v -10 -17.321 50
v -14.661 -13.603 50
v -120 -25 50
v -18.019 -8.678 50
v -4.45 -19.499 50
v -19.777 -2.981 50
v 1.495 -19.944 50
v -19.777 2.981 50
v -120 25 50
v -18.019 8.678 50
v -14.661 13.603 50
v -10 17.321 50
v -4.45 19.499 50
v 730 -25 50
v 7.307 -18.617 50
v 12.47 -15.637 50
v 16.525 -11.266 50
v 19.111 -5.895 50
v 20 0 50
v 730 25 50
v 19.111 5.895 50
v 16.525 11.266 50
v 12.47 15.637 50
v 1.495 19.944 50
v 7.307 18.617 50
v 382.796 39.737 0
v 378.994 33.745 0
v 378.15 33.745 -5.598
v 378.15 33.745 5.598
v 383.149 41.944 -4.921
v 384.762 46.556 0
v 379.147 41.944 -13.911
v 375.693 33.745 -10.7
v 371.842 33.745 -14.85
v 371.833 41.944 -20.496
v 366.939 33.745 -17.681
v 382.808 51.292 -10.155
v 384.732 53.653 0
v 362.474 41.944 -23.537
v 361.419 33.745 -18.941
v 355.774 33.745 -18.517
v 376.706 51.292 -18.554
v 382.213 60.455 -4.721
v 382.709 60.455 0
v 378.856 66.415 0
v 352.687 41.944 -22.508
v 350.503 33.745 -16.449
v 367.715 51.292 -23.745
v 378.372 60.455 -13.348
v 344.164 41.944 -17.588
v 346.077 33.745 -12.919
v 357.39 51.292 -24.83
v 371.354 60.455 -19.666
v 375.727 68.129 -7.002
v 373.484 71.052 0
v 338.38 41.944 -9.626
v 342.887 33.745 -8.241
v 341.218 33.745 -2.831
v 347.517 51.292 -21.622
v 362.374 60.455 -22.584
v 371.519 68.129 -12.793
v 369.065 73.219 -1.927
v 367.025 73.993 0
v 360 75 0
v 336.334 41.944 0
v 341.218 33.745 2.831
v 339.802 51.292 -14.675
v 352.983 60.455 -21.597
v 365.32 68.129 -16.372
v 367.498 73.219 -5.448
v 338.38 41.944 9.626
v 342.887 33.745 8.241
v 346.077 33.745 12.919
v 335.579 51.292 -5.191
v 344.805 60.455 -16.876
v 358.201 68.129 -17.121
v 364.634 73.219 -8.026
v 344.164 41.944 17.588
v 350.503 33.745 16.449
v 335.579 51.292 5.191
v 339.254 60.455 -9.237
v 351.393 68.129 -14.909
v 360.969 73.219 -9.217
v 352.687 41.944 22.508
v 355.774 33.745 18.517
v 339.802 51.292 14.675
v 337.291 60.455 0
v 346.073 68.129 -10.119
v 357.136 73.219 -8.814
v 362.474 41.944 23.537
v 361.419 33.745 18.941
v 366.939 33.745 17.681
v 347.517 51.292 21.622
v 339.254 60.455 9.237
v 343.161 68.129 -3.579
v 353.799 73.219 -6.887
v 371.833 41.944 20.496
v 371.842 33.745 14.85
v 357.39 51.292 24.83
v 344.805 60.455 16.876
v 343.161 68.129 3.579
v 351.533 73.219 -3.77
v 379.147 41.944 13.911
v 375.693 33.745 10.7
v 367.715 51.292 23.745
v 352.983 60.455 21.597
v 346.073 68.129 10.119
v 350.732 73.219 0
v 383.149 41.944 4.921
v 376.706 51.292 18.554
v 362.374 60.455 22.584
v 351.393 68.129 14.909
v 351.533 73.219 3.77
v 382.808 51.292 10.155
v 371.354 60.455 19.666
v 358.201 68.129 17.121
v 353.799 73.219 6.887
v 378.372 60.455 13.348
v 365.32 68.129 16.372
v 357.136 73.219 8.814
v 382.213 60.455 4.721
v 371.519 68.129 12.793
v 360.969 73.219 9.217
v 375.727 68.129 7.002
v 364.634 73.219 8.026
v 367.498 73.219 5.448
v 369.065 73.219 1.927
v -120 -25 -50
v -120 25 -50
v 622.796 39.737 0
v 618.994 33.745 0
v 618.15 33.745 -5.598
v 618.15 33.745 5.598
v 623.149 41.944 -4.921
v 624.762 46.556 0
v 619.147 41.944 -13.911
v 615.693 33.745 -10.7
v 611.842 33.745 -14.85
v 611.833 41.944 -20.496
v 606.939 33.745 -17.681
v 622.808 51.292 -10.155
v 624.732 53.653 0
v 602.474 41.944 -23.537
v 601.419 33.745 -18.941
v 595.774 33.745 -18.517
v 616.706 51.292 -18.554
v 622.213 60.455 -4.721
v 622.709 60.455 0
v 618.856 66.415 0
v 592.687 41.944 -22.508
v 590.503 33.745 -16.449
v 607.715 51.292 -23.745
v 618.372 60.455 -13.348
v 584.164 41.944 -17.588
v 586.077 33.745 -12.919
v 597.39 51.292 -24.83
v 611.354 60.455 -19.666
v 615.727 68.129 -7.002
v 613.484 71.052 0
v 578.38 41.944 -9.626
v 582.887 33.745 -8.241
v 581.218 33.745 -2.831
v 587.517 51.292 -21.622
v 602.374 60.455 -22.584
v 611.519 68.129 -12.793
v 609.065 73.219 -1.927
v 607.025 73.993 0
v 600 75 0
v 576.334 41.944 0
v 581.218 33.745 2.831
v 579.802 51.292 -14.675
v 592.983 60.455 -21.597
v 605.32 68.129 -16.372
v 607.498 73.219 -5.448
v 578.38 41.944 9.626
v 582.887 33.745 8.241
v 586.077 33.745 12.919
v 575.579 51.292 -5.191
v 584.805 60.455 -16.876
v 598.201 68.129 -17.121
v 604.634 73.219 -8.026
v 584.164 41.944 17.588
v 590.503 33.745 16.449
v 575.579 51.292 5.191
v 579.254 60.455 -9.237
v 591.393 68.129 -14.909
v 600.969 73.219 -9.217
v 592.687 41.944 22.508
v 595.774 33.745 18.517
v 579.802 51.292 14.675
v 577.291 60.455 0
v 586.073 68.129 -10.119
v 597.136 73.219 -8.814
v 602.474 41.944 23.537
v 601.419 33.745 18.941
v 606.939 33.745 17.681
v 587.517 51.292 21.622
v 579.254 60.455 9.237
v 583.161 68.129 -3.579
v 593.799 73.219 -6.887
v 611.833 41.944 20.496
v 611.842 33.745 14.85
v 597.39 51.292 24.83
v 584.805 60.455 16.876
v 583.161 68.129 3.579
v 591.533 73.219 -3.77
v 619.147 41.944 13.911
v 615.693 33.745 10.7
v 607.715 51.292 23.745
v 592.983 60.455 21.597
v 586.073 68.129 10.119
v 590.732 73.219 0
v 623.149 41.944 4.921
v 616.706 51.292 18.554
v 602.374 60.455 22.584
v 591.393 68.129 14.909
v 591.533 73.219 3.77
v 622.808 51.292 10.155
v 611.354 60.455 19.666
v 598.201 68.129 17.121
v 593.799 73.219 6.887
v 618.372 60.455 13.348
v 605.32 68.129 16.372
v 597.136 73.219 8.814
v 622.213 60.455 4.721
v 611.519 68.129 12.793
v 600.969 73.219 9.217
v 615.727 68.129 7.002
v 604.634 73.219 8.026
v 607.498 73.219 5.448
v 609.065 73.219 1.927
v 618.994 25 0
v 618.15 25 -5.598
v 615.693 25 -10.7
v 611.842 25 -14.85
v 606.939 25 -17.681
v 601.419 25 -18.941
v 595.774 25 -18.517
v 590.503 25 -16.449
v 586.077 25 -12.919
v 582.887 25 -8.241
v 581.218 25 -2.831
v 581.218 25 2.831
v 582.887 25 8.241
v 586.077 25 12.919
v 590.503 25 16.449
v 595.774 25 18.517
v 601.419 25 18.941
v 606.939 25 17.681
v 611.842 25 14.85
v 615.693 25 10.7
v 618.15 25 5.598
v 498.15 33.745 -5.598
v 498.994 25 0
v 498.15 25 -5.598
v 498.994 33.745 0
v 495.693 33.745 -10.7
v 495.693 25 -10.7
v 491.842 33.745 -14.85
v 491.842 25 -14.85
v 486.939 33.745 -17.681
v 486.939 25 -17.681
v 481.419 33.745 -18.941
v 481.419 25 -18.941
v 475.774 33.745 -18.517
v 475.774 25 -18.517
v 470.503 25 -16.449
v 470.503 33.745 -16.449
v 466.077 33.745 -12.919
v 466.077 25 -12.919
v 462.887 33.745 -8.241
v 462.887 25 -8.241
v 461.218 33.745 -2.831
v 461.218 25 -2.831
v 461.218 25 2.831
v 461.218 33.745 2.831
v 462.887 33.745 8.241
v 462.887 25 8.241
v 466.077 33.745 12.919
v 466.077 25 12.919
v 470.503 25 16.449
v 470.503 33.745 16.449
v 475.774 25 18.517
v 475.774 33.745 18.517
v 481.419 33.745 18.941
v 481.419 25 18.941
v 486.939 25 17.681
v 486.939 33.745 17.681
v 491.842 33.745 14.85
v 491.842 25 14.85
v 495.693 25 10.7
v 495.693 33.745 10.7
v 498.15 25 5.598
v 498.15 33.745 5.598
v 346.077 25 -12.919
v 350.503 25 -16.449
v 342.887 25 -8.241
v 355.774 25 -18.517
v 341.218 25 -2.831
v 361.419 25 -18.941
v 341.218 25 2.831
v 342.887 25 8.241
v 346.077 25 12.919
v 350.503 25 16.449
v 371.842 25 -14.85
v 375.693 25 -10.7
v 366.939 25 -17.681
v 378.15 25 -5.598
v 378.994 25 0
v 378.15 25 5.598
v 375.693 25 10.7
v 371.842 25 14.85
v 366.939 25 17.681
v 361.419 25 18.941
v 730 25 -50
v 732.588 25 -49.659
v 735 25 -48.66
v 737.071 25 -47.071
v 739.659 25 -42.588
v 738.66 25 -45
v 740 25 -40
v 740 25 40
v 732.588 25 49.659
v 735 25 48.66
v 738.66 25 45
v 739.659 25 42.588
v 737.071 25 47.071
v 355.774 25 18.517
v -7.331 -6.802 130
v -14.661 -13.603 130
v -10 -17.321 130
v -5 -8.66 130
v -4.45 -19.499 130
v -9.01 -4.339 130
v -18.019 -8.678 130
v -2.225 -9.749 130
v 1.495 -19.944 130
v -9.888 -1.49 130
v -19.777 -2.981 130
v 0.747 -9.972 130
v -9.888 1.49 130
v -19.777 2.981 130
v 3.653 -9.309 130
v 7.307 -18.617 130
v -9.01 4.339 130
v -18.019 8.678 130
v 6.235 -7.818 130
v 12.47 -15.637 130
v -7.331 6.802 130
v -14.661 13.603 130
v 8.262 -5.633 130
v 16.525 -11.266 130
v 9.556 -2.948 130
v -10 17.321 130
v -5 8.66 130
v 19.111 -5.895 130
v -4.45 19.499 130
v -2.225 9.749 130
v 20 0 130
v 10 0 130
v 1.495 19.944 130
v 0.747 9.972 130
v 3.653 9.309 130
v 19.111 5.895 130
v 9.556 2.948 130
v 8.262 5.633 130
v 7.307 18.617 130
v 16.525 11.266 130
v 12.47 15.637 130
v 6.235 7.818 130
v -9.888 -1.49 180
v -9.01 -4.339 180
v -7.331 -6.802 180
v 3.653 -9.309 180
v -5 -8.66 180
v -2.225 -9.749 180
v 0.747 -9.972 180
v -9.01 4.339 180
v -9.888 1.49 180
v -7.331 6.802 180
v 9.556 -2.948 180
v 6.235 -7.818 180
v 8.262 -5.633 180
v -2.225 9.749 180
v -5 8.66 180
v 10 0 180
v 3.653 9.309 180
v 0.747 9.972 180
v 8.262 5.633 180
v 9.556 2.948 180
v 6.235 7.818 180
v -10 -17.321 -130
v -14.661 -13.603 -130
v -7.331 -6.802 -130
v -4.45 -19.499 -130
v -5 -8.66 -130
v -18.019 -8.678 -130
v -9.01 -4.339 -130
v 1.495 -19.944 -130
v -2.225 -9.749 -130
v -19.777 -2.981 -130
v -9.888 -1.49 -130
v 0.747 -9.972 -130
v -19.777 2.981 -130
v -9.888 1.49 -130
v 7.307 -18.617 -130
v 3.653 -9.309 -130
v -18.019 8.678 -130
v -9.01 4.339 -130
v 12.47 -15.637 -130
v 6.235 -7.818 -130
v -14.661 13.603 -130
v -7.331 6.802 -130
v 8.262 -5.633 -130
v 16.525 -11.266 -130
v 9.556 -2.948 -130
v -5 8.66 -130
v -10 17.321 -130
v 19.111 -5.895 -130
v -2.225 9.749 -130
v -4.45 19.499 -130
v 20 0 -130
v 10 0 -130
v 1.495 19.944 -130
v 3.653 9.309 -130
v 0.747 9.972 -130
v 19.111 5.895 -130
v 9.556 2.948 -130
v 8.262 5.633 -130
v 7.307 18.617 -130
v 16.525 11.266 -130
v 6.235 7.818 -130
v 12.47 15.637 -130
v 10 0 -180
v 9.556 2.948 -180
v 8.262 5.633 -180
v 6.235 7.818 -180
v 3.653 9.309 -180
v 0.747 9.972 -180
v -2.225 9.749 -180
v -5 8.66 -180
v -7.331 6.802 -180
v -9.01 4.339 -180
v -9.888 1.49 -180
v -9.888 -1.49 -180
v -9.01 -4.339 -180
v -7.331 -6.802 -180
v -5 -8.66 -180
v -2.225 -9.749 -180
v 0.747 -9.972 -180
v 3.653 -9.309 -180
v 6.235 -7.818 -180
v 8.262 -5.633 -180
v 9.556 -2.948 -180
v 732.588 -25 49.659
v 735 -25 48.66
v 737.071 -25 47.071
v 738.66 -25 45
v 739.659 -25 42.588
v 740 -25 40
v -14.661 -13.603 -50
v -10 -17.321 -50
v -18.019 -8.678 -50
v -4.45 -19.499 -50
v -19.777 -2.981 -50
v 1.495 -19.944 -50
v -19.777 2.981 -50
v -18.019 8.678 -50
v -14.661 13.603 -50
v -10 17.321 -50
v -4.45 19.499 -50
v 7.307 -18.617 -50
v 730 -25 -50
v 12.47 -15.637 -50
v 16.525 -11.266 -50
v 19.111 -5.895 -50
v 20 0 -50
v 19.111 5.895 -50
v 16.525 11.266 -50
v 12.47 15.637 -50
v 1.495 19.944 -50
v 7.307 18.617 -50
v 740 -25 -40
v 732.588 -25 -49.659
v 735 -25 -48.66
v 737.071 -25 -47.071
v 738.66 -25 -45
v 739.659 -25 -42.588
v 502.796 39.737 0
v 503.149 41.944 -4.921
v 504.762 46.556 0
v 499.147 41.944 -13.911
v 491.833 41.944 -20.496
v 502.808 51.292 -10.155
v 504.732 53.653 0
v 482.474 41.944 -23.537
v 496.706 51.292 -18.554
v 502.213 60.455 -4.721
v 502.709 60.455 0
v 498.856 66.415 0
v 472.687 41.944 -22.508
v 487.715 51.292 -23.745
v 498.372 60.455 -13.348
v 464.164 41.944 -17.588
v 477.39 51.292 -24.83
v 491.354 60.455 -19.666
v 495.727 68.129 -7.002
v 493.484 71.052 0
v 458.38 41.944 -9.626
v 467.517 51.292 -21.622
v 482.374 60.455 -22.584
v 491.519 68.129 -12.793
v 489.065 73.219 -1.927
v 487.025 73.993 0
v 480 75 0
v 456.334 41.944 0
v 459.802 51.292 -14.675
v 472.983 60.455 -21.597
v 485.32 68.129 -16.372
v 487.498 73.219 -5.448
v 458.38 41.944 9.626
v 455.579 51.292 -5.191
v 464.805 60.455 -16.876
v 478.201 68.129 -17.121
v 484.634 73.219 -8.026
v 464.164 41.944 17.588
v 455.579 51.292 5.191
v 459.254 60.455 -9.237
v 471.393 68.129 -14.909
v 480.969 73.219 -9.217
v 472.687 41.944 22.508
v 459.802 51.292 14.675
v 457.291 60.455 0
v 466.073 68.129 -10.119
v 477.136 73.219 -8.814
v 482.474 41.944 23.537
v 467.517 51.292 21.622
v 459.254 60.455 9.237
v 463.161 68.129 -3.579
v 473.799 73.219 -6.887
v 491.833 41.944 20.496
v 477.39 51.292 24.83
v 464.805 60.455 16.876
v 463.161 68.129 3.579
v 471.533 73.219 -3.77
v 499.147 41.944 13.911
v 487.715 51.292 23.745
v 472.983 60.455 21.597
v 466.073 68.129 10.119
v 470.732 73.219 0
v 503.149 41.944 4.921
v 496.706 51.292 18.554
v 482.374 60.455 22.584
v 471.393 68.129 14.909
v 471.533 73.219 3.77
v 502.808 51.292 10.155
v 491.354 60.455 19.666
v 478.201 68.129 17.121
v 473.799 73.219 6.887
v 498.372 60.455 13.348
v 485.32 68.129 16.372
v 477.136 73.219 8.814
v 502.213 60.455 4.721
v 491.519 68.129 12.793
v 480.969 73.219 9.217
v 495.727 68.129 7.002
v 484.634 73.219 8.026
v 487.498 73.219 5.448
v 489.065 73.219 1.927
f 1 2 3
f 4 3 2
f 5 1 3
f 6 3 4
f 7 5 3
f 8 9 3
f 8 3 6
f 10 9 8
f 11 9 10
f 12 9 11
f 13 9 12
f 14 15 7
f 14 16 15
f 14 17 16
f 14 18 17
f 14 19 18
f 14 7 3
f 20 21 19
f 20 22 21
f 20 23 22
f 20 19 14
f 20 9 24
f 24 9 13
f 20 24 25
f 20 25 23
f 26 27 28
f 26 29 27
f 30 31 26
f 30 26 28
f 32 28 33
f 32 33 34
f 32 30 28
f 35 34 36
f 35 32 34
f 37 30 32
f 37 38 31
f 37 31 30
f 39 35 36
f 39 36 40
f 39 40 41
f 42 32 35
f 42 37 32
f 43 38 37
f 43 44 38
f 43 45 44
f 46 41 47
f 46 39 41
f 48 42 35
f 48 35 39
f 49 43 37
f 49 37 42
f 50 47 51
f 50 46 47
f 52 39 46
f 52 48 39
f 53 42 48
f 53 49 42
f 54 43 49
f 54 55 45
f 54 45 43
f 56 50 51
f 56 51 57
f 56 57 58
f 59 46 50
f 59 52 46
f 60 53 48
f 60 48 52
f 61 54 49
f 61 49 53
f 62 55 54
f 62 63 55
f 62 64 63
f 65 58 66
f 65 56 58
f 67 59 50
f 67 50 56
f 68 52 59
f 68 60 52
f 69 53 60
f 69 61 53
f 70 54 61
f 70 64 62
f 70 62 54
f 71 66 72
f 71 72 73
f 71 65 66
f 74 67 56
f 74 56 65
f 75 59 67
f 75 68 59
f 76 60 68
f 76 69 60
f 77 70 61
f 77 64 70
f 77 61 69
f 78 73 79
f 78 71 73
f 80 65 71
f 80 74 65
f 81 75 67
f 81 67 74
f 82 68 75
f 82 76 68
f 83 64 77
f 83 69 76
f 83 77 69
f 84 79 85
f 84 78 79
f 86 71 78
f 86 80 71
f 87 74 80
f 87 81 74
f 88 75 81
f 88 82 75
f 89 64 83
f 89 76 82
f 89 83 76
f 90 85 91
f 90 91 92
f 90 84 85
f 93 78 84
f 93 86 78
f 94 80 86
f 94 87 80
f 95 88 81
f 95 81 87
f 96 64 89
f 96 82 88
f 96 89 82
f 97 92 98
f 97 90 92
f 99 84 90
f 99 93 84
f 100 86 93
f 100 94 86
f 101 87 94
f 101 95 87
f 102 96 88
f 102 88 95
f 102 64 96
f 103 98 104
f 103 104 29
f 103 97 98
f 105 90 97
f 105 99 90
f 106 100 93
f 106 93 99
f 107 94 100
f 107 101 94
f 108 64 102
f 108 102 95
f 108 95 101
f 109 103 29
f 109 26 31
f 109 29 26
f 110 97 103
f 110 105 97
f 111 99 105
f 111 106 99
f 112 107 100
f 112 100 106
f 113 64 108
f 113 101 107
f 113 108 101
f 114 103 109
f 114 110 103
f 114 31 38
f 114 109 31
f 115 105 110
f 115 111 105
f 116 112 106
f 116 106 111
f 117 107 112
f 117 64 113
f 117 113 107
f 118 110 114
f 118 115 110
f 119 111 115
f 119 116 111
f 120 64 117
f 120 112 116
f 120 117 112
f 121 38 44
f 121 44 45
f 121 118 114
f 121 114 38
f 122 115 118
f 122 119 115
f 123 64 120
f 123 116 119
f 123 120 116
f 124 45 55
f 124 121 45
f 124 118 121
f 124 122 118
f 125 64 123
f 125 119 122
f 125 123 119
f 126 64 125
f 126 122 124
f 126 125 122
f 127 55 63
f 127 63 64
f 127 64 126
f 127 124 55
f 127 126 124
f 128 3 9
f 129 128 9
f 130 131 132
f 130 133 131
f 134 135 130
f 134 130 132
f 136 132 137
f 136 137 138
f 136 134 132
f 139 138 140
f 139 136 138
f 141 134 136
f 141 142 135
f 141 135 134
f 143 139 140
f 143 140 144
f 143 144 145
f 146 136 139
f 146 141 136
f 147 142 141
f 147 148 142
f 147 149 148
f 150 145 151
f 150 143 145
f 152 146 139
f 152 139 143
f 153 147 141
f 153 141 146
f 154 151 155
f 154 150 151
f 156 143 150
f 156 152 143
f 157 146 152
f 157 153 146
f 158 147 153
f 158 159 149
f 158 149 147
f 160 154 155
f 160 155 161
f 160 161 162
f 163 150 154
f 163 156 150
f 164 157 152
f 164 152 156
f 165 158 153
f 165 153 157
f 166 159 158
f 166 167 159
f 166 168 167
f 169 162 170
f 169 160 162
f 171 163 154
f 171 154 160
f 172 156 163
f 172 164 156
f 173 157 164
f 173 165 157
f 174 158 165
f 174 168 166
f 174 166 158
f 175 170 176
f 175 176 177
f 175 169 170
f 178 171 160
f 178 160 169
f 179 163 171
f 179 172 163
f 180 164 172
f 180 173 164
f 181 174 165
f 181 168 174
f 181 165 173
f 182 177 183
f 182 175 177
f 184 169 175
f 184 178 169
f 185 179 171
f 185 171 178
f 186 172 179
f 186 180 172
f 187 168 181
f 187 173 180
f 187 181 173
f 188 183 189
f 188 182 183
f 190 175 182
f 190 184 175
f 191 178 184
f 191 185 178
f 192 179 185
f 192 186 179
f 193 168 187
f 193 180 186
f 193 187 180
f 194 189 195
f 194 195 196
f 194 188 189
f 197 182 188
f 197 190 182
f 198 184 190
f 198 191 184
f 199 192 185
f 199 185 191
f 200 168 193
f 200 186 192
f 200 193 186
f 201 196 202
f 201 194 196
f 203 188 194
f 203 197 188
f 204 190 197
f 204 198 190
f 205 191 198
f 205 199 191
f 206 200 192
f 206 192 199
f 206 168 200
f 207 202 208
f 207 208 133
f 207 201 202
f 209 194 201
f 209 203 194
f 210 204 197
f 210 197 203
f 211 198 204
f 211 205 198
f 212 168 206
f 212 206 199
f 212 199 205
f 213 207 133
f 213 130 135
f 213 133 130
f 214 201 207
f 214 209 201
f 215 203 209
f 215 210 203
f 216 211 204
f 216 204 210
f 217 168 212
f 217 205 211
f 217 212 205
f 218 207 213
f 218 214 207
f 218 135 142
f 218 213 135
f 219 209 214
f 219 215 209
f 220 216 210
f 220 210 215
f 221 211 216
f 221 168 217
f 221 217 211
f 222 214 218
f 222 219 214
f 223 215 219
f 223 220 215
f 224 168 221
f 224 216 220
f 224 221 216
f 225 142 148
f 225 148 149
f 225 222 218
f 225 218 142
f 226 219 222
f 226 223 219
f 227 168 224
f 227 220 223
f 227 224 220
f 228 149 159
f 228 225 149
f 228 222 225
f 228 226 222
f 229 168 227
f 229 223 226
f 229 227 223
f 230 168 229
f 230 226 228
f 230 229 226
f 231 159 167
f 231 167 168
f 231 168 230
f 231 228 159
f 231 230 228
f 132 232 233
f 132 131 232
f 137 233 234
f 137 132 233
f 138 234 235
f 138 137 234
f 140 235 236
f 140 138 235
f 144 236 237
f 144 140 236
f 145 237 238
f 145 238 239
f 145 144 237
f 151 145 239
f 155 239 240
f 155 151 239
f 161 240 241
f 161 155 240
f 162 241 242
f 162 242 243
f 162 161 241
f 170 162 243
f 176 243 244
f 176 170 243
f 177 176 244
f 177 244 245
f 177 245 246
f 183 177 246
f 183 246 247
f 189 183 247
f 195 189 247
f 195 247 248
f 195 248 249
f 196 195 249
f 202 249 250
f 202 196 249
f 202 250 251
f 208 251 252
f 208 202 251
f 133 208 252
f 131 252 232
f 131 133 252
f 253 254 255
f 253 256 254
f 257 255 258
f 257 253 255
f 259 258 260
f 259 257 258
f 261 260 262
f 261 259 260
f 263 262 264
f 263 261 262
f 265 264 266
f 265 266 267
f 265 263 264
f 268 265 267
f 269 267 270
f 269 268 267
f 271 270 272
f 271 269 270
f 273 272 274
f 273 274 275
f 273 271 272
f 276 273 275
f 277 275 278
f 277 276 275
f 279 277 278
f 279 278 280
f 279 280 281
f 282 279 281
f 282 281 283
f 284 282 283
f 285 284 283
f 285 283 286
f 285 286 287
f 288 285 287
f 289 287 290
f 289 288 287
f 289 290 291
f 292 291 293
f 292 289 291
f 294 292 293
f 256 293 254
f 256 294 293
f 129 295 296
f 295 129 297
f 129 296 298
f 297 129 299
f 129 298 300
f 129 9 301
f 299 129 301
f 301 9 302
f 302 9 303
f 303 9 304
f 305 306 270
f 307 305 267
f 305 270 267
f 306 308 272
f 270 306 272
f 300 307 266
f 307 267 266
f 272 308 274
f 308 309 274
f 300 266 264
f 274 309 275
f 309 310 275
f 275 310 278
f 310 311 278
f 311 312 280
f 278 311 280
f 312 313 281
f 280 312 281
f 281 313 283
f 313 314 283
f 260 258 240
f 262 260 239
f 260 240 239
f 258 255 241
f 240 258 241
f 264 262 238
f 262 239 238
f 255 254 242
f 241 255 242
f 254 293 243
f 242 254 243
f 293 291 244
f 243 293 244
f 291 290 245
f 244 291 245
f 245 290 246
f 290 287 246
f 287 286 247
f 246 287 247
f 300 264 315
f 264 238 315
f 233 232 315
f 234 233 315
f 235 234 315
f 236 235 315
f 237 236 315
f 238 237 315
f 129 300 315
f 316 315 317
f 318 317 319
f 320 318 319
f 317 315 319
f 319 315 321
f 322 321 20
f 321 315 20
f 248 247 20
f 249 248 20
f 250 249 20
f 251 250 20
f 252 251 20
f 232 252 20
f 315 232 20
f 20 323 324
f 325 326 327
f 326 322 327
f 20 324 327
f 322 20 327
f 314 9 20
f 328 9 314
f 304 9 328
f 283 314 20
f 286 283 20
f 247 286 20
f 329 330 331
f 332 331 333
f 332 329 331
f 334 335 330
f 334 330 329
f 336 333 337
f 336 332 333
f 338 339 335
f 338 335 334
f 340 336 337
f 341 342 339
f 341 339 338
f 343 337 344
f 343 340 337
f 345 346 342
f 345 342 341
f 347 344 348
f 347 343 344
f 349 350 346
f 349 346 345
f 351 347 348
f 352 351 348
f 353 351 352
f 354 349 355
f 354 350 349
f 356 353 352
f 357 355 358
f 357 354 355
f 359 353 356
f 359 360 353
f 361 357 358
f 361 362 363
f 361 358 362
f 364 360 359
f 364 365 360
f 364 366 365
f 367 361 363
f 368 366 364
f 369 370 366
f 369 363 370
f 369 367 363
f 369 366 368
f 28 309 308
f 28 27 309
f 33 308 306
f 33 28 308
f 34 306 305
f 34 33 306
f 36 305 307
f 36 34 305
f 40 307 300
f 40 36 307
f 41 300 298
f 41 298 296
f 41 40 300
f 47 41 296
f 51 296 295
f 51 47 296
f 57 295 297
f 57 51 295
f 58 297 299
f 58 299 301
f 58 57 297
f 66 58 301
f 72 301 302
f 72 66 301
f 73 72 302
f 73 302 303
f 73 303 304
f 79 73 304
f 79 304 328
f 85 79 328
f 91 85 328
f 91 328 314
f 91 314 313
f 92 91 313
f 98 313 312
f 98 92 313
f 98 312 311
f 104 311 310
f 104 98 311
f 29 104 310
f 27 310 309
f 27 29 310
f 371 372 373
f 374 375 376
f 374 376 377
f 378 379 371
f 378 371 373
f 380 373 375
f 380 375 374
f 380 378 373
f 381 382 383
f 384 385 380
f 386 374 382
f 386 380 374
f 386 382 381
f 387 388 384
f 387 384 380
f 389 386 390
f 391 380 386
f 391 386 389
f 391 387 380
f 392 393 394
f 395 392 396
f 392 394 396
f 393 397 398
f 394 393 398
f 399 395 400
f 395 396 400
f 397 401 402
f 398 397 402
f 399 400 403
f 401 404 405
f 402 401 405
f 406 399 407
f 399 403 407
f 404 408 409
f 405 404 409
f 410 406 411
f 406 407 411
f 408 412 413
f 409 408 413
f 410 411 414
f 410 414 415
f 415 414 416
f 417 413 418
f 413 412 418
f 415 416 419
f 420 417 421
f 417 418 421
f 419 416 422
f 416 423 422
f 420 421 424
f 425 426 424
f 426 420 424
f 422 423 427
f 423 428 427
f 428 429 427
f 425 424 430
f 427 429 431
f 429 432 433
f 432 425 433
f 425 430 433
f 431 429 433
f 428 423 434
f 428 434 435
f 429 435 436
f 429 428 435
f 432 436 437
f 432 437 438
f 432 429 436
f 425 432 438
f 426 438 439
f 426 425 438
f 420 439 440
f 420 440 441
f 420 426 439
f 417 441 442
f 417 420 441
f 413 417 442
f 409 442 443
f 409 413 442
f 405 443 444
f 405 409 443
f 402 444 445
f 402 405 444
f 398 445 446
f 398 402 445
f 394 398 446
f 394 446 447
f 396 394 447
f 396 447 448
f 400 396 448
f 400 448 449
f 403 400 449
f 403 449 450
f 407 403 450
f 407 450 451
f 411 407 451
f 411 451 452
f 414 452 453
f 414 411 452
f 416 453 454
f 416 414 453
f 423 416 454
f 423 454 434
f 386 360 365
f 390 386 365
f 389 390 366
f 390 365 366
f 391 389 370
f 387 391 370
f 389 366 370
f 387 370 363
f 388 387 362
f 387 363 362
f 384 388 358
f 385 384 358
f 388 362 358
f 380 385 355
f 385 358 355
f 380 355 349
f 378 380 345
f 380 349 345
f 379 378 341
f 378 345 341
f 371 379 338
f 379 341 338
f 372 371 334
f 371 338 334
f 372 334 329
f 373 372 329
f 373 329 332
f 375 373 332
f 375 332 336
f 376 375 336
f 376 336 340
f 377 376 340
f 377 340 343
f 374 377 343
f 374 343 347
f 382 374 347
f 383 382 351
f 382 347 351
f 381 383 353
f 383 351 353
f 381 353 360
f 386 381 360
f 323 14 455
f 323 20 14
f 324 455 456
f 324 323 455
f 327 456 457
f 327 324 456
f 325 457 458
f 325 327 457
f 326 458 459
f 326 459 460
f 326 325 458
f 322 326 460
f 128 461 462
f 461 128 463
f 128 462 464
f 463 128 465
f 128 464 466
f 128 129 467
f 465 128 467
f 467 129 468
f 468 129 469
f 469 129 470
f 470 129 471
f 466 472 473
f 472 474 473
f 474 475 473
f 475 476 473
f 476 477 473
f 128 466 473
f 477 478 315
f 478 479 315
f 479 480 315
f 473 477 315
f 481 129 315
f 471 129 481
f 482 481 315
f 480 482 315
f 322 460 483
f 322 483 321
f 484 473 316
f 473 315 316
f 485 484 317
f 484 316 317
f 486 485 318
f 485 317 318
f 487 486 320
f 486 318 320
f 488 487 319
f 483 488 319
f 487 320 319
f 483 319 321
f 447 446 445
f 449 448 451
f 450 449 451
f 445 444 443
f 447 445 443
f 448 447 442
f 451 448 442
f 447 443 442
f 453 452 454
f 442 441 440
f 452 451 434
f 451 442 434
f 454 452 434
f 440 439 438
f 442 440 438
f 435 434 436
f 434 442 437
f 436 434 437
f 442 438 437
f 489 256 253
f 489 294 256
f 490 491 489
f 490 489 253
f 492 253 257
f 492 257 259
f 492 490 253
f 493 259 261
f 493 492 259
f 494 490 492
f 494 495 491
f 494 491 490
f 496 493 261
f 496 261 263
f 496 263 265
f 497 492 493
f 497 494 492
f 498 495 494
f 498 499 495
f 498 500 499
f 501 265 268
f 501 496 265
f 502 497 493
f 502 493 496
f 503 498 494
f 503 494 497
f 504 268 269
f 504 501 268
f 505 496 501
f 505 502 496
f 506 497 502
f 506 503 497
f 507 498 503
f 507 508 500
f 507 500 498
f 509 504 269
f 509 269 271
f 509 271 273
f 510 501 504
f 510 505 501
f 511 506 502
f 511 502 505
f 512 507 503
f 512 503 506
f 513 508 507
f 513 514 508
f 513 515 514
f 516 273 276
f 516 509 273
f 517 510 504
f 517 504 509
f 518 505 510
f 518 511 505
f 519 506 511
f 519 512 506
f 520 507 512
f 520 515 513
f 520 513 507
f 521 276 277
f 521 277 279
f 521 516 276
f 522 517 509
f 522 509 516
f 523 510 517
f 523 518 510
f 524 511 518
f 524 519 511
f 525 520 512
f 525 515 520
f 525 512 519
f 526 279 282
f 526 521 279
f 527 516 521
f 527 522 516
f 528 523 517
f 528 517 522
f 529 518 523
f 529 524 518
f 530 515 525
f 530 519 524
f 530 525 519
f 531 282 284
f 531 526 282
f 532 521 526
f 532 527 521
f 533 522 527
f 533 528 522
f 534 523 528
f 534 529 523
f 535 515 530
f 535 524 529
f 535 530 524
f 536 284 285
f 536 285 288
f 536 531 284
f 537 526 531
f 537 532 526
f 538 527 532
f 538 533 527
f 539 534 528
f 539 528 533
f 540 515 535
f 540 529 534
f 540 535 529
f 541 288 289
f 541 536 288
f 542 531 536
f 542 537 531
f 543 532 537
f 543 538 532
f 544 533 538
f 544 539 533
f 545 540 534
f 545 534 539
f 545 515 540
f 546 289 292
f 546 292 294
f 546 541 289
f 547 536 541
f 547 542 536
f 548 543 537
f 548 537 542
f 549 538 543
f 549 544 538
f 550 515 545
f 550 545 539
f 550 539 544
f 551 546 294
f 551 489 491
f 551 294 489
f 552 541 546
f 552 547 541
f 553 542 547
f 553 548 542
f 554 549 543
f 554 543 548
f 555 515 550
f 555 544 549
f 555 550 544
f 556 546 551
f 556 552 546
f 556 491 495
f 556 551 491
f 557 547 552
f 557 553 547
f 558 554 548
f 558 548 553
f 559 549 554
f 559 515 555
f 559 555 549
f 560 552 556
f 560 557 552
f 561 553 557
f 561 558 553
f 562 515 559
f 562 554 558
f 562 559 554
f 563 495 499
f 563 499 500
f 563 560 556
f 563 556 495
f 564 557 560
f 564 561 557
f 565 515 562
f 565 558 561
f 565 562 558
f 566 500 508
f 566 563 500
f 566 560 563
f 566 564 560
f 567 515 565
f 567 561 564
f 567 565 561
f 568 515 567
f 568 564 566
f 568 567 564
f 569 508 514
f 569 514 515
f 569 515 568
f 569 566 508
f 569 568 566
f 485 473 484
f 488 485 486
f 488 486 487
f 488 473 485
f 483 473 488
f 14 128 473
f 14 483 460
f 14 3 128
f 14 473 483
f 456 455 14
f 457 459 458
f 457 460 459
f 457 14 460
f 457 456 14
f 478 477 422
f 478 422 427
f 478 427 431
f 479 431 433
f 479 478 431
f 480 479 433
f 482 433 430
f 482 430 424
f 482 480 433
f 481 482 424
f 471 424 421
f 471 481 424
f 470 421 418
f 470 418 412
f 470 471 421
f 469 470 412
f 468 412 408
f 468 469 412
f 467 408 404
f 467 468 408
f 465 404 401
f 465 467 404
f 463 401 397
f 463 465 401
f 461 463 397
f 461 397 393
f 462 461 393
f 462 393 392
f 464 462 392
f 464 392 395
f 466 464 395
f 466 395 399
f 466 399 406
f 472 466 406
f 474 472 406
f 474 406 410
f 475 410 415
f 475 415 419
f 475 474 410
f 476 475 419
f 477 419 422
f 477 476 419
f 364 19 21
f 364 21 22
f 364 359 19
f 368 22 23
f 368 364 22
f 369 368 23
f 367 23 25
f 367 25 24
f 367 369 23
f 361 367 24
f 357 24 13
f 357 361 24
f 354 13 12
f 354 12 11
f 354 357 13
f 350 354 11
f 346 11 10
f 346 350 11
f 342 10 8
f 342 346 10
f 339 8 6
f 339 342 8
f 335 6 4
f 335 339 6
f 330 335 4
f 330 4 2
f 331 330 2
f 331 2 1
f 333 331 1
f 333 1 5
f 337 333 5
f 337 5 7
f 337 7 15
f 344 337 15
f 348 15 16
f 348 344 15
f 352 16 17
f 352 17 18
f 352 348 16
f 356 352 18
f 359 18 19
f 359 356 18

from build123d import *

# Parameters (mm, degrees)
SKETCH_1_R              = 20
EXTRUDE_1_DEPTH         = 130
SKETCH_2_W              = 860
SKETCH_2_H              = 50
EXTRUDE_2_DEPTH         = 50
SKETCH_3_R              = 10
EXTRUDE_3_DEPTH         = 50
PATTERN_LINEAR_16_COUNT = 3
PATTERN_LINEAR_16_PITCH = 120
FILLET_1_R              = 10


with BuildPart() as part:
    # 草图1 → 凸台-拉伸1 (new body, symmetric)
    with BuildSketch(Plane.XY):
        Circle(SKETCH_1_R)
    extrude(amount=EXTRUDE_1_DEPTH, both=True)

    # 草图2 → 凸台-拉伸2 (add, symmetric)
    with BuildSketch(Plane.XY):
        with Locations((310, 0)):
            Rectangle(SKETCH_2_W, SKETCH_2_H)
    extrude(amount=EXTRUDE_2_DEPTH, both=True)

    # 草图3 → 凸台-拉伸3 (add)
    with BuildSketch(Plane.XY.offset(130)):
        Circle(SKETCH_3_R)
    extrude_3 = extrude(amount=EXTRUDE_3_DEPTH)

    # 镜向1: 凸台-拉伸3 across plane
    add(extrude_3.mirror(Plane.XY))

    # 草图6 → 旋转3 (revolve)
    with BuildSketch(Plane.XY):
        with BuildLine():
            Line((360, 75), (360, 50))
            Line((360, 50), (360, 25))
            Line((360, 25), (378.993679067, 25))
            Line((378.993679067, 25), (378.993679067, 33.744534596))
            ThreePointArc((378.993679067, 33.744534596), (382.708881909, 60.454983618), (360, 75))
        make_face()
    revolve_3 = revolve(axis=Axis((360, 25, 0), (0, 1, 0)))

    # 阵列(线性)16: 旋转3 ×3
    with Locations(*[(i * PATTERN_LINEAR_16_PITCH, 0, 0) for i in range(1, PATTERN_LINEAR_16_COUNT)]):
        add(revolve_3)

    # 圆角1
    fillet_1_edges = [part.edges().sort_by_distance(p)[0] for p in [
        (740, 0, -50),
        (740, 0, 50),
    ]]
    fillet(fillet_1_edges, radius=FILLET_1_R)


solid = part.part
